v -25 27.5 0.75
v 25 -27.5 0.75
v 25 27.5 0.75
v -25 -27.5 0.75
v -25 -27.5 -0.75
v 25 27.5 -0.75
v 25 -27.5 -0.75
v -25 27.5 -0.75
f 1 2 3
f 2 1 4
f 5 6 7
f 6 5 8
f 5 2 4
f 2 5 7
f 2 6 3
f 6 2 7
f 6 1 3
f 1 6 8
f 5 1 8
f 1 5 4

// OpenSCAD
// ========================================
// a plate 50 mm wide 55 mm deep and 1.5 mm thick
// NeuroCAD canonical IR; dimensions are millimetres
// ========================================
$fn = 48;

cube(size=[50, 55, 1.5], center=true);
